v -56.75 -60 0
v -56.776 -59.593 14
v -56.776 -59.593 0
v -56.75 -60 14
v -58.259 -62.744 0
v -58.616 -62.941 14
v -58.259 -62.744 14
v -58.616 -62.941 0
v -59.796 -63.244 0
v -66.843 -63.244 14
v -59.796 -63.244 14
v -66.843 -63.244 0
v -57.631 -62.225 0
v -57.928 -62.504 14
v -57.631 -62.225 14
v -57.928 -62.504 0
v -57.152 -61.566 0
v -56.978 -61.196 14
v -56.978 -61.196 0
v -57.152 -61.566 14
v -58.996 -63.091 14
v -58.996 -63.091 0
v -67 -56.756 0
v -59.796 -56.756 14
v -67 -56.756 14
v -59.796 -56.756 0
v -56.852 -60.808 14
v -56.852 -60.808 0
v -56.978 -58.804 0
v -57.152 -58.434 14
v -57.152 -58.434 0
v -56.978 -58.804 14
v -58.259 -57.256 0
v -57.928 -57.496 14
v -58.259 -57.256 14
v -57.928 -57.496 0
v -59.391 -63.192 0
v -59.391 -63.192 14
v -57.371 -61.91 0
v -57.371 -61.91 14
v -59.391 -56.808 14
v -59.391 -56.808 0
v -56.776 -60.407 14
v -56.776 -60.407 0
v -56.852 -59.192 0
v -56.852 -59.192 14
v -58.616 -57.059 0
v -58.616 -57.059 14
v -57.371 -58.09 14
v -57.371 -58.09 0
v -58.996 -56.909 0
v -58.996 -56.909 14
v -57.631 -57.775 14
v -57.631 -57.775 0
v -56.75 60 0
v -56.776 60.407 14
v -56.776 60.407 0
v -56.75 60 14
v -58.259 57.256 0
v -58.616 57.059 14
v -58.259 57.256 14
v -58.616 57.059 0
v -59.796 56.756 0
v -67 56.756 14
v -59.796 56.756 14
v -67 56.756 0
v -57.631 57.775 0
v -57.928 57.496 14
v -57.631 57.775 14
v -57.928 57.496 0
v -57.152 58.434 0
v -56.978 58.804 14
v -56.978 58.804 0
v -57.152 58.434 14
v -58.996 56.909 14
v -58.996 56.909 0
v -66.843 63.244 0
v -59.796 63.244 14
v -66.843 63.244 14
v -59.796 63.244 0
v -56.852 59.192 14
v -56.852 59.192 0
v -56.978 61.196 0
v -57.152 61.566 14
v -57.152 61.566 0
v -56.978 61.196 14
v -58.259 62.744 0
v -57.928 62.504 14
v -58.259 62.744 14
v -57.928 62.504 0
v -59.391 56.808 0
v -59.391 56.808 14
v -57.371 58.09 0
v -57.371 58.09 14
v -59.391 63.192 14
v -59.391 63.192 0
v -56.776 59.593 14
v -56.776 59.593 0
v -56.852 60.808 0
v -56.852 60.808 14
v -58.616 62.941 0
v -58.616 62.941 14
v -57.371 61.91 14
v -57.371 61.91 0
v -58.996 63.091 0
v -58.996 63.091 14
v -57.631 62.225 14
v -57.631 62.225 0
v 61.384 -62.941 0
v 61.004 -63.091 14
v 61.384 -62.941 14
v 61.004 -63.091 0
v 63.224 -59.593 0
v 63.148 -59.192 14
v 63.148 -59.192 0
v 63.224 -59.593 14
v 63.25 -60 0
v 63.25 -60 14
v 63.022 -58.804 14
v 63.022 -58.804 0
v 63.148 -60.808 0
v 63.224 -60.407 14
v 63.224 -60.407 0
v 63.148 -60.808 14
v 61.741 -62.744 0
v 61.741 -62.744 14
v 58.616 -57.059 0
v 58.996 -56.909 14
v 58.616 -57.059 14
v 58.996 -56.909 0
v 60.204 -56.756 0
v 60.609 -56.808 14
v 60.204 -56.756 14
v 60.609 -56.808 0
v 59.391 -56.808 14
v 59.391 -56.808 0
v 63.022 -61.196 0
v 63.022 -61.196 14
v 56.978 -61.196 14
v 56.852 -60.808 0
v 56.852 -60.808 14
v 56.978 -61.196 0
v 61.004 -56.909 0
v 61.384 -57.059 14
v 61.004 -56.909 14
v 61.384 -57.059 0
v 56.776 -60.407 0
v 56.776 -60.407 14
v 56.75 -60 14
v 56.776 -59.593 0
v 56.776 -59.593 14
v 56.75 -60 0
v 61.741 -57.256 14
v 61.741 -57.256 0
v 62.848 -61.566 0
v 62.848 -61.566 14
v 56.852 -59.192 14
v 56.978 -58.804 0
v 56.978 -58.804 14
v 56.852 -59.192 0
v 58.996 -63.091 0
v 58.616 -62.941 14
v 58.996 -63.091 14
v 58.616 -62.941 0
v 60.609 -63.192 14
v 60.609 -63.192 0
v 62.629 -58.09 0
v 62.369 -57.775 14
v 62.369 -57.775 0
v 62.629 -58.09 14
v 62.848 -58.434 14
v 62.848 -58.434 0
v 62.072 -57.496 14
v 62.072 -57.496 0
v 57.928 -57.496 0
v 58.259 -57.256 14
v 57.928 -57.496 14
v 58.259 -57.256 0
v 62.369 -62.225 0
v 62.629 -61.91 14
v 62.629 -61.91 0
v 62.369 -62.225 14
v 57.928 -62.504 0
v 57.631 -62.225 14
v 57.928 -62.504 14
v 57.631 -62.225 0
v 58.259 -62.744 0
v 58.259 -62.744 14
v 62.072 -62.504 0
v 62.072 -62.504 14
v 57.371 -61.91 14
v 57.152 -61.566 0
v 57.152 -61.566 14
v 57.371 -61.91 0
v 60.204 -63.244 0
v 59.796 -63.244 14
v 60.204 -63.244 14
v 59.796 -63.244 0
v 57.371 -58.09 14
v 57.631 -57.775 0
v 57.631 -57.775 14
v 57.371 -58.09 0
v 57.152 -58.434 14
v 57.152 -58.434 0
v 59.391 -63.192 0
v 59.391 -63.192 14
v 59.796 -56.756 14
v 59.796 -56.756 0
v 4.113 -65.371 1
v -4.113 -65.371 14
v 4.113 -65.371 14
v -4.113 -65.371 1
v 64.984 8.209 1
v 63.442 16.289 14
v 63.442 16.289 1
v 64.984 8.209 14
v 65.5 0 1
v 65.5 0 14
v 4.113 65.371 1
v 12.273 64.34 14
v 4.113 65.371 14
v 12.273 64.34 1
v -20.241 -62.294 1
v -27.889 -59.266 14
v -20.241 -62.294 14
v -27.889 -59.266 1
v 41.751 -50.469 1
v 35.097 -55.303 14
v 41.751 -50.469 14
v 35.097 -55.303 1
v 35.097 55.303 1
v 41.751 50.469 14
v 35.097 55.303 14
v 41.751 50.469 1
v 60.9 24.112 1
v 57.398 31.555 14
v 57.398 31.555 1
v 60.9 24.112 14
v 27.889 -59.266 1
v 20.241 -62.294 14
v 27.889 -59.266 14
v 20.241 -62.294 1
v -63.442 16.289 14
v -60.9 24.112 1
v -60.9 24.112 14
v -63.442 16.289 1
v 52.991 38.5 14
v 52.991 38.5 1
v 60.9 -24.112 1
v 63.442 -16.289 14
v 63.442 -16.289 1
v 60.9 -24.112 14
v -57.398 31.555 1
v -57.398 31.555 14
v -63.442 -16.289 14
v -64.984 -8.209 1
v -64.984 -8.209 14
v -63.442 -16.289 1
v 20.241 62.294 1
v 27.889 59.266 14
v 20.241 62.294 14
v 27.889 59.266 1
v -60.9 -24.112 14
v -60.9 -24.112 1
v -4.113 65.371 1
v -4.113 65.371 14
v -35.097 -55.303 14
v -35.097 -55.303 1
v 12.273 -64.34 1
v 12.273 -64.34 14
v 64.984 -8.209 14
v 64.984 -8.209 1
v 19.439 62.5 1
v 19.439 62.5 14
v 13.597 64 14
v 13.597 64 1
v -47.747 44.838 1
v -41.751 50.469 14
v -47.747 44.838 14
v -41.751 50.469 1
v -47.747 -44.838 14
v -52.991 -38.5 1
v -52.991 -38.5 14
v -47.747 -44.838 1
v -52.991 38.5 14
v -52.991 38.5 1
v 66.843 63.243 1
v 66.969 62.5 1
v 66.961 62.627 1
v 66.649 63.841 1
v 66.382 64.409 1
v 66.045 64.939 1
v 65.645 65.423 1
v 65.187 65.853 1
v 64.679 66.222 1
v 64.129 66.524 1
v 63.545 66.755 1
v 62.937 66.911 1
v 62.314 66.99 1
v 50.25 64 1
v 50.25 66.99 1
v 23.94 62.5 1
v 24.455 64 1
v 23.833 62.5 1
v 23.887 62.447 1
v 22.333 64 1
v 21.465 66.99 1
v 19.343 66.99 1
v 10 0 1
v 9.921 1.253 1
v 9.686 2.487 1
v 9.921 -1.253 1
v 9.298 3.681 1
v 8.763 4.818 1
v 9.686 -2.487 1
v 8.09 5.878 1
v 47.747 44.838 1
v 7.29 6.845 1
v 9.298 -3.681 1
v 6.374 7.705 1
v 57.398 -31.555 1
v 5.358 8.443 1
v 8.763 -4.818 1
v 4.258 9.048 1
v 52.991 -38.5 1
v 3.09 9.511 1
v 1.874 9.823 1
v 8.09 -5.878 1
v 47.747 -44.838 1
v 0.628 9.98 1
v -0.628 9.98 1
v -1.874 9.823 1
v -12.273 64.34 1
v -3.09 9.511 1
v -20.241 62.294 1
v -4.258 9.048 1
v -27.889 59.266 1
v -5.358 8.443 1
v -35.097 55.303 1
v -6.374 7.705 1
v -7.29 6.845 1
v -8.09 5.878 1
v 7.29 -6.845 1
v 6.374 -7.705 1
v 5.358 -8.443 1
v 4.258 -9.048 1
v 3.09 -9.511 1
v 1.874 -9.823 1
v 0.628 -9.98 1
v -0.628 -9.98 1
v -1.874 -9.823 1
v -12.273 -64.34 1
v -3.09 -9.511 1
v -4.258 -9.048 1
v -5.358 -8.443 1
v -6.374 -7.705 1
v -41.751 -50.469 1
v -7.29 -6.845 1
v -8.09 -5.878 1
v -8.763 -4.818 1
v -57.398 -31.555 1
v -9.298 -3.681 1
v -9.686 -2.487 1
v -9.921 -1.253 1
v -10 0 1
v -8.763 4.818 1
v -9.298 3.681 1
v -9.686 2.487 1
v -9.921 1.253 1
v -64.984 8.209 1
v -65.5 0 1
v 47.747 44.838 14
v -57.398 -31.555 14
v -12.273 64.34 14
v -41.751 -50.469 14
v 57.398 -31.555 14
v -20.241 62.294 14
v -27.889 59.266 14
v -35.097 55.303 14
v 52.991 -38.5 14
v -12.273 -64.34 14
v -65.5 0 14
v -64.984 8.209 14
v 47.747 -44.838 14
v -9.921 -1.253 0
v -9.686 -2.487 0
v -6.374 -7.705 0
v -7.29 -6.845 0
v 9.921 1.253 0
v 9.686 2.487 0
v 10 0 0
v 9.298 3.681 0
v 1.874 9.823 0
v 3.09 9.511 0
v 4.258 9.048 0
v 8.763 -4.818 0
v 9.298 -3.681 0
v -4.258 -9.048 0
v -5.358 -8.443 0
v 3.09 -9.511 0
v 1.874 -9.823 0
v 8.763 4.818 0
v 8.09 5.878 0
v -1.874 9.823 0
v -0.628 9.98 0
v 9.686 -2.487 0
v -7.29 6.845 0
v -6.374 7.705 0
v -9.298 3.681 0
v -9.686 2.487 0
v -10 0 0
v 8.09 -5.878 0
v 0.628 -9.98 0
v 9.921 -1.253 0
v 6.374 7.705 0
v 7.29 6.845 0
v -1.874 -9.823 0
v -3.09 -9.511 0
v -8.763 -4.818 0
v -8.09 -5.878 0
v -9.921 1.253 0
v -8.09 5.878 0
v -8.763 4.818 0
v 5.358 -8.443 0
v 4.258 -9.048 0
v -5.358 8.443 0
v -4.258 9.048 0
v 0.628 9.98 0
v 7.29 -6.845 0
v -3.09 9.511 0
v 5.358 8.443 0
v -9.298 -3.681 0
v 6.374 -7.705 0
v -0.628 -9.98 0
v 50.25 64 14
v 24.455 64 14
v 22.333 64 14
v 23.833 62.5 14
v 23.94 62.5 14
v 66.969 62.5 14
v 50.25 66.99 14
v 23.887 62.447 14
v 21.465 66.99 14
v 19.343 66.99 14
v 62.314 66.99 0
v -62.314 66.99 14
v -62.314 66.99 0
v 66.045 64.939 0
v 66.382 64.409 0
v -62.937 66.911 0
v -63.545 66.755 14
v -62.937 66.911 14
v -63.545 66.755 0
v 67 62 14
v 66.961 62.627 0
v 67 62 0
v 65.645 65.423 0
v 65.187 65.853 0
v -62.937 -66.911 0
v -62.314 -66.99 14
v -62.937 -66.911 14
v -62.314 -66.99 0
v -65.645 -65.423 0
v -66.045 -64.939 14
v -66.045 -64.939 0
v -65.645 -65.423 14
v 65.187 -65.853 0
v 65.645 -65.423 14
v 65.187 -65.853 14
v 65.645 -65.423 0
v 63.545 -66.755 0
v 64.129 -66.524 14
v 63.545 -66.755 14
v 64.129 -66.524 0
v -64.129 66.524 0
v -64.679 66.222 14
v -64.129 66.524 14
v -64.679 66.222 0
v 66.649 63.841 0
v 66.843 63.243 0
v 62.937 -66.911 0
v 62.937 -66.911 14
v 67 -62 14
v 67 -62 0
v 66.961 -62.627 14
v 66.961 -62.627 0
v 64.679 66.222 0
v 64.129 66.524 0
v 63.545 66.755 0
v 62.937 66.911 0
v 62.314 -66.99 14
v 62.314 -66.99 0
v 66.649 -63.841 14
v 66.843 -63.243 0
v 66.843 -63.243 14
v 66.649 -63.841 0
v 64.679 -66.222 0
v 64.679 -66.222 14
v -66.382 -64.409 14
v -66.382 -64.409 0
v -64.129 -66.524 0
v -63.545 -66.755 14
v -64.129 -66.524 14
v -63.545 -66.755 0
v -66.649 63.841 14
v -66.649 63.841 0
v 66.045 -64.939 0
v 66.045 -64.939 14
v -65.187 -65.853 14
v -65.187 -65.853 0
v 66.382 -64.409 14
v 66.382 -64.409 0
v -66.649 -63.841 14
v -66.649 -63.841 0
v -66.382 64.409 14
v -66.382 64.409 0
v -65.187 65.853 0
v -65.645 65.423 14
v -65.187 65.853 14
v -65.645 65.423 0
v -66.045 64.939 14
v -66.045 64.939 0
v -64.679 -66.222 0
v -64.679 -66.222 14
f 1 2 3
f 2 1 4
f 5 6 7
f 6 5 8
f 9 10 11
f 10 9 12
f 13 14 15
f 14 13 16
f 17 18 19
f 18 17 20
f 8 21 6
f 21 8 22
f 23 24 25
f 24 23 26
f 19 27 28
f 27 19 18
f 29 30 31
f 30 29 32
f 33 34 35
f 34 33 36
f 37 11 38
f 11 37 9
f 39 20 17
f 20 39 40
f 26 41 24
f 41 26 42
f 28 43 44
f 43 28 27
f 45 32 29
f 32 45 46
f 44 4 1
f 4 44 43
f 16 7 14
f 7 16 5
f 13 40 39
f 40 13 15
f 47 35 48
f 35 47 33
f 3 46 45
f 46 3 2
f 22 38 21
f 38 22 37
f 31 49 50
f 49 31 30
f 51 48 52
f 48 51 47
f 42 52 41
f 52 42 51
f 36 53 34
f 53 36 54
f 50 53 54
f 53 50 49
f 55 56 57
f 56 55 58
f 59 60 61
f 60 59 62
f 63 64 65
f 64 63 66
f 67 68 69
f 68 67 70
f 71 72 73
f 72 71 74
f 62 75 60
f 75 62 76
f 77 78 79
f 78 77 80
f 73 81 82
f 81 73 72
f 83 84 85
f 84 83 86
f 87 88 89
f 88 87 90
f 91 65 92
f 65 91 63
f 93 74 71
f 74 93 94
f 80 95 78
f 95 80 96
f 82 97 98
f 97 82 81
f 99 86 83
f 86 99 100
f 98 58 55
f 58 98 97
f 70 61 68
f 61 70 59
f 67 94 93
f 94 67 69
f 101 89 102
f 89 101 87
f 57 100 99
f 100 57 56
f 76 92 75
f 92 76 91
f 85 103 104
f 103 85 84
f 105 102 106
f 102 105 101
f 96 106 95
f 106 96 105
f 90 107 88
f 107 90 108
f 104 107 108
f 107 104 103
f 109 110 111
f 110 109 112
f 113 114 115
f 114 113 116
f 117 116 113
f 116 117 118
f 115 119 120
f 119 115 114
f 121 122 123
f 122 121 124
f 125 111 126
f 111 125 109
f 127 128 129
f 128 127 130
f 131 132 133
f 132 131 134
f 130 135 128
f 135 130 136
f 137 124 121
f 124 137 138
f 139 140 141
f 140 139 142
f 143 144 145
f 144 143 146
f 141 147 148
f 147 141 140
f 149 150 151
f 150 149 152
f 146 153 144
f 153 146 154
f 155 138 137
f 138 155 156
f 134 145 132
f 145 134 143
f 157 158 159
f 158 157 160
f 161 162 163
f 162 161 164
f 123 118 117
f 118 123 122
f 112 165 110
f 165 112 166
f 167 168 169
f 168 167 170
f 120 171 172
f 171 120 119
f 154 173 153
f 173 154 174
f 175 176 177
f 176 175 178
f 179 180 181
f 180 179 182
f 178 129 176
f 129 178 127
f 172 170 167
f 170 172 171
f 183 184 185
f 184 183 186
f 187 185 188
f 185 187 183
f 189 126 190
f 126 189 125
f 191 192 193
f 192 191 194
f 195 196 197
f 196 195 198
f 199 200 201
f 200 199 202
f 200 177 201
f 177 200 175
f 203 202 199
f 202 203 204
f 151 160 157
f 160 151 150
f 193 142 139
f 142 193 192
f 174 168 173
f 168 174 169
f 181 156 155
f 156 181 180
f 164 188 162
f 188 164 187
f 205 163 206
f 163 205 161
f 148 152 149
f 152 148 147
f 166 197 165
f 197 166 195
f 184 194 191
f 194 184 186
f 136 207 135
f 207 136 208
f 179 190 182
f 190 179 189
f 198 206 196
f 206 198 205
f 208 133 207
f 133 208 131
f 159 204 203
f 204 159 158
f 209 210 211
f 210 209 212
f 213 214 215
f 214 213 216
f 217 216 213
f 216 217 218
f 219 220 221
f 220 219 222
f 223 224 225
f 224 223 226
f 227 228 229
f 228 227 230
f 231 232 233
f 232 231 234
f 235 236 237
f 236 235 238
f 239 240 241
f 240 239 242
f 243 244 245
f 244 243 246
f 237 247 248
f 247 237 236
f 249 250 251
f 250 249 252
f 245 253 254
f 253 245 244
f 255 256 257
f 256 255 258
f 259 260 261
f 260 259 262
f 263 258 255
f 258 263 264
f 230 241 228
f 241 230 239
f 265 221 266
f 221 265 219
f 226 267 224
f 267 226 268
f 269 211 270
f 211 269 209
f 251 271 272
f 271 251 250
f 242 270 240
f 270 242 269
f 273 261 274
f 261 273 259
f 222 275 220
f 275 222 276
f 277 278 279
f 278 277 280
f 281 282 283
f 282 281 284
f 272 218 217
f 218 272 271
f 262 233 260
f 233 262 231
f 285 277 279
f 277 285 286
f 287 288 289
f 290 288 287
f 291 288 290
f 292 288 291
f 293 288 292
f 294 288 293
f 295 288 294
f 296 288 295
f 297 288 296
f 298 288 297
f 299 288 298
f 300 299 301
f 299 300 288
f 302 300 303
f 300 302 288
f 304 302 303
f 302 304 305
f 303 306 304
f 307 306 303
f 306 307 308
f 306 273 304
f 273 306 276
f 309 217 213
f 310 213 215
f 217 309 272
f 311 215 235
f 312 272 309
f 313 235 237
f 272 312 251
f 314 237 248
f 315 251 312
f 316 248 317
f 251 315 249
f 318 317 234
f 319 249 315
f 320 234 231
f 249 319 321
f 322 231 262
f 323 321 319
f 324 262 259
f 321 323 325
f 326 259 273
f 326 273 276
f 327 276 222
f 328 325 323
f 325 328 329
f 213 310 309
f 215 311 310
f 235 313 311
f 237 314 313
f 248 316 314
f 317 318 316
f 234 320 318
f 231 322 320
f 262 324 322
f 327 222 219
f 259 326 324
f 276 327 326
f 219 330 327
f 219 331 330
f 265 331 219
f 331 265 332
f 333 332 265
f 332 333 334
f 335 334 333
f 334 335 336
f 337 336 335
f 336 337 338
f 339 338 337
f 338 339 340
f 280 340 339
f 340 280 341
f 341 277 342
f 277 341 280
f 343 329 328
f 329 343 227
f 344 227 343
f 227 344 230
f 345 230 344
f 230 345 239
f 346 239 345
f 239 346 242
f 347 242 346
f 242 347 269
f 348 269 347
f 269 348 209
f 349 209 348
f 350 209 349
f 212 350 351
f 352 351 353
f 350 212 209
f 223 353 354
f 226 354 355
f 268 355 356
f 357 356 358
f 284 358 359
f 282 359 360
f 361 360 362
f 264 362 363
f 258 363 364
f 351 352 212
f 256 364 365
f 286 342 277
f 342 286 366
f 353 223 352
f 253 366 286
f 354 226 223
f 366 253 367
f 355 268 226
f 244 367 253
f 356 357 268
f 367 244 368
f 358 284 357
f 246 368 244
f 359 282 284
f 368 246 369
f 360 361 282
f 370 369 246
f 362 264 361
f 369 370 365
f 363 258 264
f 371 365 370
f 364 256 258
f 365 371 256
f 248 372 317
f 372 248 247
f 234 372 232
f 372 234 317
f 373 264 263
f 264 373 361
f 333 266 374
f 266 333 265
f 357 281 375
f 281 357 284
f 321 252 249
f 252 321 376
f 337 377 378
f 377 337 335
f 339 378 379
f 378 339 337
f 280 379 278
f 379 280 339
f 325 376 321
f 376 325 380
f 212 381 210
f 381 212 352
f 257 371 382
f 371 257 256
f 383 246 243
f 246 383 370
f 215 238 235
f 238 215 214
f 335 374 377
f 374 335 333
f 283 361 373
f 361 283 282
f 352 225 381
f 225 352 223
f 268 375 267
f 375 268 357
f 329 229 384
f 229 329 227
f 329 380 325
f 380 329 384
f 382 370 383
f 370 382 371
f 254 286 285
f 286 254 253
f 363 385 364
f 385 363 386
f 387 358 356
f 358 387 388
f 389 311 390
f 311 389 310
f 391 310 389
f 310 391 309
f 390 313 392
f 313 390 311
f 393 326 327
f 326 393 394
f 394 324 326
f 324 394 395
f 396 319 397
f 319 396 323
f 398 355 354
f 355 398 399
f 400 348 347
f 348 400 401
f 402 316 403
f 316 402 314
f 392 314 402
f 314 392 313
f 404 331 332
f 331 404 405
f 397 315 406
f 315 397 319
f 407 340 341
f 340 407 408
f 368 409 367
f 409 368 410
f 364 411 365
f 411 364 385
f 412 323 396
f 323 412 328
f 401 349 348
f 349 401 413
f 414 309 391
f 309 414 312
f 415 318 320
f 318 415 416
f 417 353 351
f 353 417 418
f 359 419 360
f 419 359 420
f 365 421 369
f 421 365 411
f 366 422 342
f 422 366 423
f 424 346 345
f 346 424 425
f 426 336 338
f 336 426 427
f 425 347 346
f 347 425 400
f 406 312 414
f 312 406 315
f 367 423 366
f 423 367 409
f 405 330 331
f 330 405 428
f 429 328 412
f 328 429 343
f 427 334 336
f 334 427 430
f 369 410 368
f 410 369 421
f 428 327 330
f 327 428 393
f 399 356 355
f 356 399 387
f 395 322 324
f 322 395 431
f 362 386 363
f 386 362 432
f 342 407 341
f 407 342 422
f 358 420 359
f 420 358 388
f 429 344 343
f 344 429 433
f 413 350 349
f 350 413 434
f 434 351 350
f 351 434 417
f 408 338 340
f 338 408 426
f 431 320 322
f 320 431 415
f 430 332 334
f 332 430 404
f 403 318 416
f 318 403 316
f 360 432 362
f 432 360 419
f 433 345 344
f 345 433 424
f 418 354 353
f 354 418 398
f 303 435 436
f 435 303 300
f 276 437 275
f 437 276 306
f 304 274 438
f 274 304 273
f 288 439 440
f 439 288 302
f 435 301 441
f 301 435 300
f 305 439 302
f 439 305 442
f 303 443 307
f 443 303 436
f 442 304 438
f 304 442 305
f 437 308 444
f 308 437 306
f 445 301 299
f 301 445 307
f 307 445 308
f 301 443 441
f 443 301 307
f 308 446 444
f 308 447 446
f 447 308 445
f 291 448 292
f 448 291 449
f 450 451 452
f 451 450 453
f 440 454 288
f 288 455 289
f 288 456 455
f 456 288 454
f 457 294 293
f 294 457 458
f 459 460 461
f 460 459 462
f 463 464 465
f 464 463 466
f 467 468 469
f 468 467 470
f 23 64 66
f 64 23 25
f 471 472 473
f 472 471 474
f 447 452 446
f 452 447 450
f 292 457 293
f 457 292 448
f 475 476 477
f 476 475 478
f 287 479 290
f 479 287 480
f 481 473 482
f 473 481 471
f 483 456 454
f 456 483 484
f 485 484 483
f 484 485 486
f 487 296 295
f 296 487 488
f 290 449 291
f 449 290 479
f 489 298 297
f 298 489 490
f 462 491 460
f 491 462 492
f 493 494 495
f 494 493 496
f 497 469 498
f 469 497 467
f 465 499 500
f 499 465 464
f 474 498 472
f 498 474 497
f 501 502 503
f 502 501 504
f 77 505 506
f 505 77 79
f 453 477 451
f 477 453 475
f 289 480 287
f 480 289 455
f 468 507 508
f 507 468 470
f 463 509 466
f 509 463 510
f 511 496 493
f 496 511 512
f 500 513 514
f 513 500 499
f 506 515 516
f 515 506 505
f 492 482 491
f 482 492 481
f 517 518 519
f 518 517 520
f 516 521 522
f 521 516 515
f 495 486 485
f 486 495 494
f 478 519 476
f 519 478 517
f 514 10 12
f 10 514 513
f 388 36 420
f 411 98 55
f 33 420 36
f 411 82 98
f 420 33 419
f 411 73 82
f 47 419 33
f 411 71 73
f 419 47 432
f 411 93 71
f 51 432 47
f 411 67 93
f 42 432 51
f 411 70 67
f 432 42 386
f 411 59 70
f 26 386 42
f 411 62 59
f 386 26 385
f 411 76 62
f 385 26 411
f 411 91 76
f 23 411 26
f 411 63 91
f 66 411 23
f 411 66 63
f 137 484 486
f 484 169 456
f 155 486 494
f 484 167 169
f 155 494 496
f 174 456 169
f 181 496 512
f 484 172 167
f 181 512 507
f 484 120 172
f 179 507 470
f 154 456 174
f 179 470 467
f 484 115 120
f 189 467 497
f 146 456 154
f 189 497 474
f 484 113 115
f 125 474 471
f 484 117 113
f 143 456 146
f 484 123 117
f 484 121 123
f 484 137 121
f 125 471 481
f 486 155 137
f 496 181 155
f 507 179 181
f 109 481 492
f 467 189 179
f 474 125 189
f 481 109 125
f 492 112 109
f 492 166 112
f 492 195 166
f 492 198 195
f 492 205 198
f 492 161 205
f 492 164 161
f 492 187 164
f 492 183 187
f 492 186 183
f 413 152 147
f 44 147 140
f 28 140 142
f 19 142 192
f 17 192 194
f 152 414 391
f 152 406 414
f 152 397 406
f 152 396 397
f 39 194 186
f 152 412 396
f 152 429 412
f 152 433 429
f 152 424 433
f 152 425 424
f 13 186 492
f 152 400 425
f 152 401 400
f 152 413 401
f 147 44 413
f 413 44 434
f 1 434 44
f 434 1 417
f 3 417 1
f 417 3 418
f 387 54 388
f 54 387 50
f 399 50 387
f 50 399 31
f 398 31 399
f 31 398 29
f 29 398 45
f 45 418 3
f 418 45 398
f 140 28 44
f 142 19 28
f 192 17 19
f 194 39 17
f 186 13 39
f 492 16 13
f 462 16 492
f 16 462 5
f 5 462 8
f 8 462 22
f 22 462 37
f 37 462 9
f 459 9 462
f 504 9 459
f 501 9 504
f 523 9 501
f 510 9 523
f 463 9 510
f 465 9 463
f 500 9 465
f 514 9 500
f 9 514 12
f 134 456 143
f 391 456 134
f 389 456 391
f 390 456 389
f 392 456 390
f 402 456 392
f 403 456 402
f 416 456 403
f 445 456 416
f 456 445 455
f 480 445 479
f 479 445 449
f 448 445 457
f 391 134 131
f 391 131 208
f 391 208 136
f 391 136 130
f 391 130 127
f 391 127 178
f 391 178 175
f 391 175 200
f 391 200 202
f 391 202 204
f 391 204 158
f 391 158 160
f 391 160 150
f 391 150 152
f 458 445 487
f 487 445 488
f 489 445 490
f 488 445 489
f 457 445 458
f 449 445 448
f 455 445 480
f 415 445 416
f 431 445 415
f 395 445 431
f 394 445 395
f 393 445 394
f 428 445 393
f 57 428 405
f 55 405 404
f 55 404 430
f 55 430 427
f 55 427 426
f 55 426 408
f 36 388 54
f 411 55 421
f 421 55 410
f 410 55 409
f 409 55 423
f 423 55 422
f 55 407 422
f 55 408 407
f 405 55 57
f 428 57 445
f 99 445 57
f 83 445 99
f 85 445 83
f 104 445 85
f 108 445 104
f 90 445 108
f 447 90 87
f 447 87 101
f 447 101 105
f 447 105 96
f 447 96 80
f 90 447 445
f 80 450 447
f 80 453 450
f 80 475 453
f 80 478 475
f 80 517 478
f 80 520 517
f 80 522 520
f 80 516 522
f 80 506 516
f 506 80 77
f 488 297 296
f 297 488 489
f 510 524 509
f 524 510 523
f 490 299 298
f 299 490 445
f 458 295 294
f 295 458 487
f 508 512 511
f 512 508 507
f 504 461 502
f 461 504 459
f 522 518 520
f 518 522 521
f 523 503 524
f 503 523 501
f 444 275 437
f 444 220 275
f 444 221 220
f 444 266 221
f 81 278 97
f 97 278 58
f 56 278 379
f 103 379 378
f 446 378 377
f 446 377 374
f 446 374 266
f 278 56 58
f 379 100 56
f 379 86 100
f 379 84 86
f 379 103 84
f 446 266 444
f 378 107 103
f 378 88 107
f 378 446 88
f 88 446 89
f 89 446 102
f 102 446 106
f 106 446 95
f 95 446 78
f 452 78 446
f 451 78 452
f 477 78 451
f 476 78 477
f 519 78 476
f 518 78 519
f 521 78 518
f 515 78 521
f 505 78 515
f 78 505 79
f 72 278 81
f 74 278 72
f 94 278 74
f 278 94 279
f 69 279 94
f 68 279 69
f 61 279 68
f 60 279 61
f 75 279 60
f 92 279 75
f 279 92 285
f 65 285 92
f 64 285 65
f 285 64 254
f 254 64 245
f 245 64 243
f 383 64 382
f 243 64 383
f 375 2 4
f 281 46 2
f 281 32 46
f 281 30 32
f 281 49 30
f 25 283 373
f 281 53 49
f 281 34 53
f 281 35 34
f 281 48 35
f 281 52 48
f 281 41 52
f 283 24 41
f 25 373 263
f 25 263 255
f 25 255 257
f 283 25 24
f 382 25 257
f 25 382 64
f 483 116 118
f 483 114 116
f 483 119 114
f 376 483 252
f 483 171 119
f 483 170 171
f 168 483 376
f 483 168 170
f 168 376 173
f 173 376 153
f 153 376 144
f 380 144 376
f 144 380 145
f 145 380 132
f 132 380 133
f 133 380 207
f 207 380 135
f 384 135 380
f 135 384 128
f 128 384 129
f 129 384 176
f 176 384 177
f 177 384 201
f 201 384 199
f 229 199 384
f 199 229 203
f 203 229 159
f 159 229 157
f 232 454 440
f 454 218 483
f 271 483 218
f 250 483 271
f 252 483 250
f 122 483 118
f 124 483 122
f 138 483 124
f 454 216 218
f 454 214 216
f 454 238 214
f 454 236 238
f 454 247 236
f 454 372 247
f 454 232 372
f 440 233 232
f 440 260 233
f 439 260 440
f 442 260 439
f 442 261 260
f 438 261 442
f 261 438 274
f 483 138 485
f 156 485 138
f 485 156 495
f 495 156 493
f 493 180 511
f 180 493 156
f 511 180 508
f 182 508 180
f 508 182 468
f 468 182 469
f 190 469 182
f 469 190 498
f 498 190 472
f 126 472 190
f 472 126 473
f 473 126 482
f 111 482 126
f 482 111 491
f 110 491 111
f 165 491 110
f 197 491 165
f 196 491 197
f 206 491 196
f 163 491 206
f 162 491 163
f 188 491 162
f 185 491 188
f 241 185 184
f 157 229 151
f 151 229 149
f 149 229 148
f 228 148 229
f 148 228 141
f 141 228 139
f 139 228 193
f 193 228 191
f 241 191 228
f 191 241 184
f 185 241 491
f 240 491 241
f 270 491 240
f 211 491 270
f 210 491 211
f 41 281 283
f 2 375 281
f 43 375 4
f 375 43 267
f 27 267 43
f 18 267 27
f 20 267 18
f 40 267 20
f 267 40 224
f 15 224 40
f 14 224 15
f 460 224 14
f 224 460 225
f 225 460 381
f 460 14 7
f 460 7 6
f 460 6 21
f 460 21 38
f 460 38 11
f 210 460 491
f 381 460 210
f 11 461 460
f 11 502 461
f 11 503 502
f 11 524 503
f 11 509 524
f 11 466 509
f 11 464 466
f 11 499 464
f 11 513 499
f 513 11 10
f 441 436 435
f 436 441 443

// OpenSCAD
$fn = 50;


difference() {
	union() {
		translate(v = [0, 0, 0]) {
			rotate(a = [0, 0, 0]) {
				hull() {
					translate(v = [-62.0000000000, 62.0000000000, 0]) {
						rotate(a = [0, 0, 0]) {
							translate(v = [0, 0, 0]) {
								rotate(a = [0, 0, 0]) {
									cylinder(h = 14, r = 5);
								}
							}
						}
					}
					translate(v = [62.0000000000, 62.0000000000, 0]) {
						rotate(a = [0, 0, 0]) {
							translate(v = [0, 0, 0]) {
								rotate(a = [0, 0, 0]) {
									cylinder(h = 14, r = 5);
								}
							}
						}
					}
					translate(v = [-62.0000000000, -62.0000000000, 0]) {
						rotate(a = [0, 0, 0]) {
							translate(v = [0, 0, 0]) {
								rotate(a = [0, 0, 0]) {
									cylinder(h = 14, r = 5);
								}
							}
						}
					}
					translate(v = [62.0000000000, -62.0000000000, 0]) {
						rotate(a = [0, 0, 0]) {
							translate(v = [0, 0, 0]) {
								rotate(a = [0, 0, 0]) {
									cylinder(h = 14, r = 5);
								}
							}
						}
					}
				}
			}
		}
	}
	union() {
		translate(v = [-67.5000000000, -60.0000000000, -125]) {
			rotate(a = [0, 0, 0]) {
				hull() {
					translate(v = [7.5000000000, 0, 0]) {
						rotate(a = [0, 0, 0]) {
							translate(v = [0, 0, 0]) {
								rotate(a = [0, 0, 0]) {
									cylinder(h = 250, r = 3.2500000000);
								}
							}
						}
					}
					translate(v = [-7.5000000000, 0, 0]) {
						rotate(a = [0, 0, 0]) {
							translate(v = [0, 0, 0]) {
								rotate(a = [0, 0, 0]) {
									cylinder(h = 250, r = 3.2500000000);
								}
							}
						}
					}
				}
			}
		}
		translate(v = [-67.5000000000, 60.0000000000, -125]) {
			rotate(a = [0, 0, 0]) {
				hull() {
					translate(v = [7.5000000000, 0, 0]) {
						rotate(a = [0, 0, 0]) {
							translate(v = [0, 0, 0]) {
								rotate(a = [0, 0, 0]) {
									cylinder(h = 250, r = 3.2500000000);
								}
							}
						}
					}
					translate(v = [-7.5000000000, 0, 0]) {
						rotate(a = [0, 0, 0]) {
							translate(v = [0, 0, 0]) {
								rotate(a = [0, 0, 0]) {
									cylinder(h = 250, r = 3.2500000000);
								}
							}
						}
					}
				}
			}
		}
		translate(v = [60.0000000000, -60.0000000000, -125.0000000000]) {
			rotate(a = [0, 0, 0]) {
				cylinder(h = 250, r = 3.2500000000);
			}
		}
		translate(v = [0, 0, 1.0000000000]) {
			rotate(a = [0, 0, 0]) {
				cylinder(h = 16, r = 65.5000000000);
			}
		}
		translate(v = [0, 0, -7.0000000000]) {
			rotate(a = [0, 0, 0]) {
				cylinder(h = 14, r = 10.0000000000);
			}
		}
		translate(v = [0.0000000000, 62.5000000000, 1]) {
			rotate(a = [0, 0, 0]) {
				cube(size = [67.0000000000, 1.5000000000, 16]);
			}
		}
		translate(v = [50.2500000000, 62.5000000000, 1]) {
			rotate(a = [0, 0, 0]) {
				cube(size = [16.7500000000, 4.5000000000, 16]);
			}
		}
		translate(v = [18.5833333333, 67.7500000000, 1]) {
			rotate(a = [0, 0, -45]) {
				cube(size = [7.5000000000, 1.5000000000, 16]);
			}
		}
	}
}
